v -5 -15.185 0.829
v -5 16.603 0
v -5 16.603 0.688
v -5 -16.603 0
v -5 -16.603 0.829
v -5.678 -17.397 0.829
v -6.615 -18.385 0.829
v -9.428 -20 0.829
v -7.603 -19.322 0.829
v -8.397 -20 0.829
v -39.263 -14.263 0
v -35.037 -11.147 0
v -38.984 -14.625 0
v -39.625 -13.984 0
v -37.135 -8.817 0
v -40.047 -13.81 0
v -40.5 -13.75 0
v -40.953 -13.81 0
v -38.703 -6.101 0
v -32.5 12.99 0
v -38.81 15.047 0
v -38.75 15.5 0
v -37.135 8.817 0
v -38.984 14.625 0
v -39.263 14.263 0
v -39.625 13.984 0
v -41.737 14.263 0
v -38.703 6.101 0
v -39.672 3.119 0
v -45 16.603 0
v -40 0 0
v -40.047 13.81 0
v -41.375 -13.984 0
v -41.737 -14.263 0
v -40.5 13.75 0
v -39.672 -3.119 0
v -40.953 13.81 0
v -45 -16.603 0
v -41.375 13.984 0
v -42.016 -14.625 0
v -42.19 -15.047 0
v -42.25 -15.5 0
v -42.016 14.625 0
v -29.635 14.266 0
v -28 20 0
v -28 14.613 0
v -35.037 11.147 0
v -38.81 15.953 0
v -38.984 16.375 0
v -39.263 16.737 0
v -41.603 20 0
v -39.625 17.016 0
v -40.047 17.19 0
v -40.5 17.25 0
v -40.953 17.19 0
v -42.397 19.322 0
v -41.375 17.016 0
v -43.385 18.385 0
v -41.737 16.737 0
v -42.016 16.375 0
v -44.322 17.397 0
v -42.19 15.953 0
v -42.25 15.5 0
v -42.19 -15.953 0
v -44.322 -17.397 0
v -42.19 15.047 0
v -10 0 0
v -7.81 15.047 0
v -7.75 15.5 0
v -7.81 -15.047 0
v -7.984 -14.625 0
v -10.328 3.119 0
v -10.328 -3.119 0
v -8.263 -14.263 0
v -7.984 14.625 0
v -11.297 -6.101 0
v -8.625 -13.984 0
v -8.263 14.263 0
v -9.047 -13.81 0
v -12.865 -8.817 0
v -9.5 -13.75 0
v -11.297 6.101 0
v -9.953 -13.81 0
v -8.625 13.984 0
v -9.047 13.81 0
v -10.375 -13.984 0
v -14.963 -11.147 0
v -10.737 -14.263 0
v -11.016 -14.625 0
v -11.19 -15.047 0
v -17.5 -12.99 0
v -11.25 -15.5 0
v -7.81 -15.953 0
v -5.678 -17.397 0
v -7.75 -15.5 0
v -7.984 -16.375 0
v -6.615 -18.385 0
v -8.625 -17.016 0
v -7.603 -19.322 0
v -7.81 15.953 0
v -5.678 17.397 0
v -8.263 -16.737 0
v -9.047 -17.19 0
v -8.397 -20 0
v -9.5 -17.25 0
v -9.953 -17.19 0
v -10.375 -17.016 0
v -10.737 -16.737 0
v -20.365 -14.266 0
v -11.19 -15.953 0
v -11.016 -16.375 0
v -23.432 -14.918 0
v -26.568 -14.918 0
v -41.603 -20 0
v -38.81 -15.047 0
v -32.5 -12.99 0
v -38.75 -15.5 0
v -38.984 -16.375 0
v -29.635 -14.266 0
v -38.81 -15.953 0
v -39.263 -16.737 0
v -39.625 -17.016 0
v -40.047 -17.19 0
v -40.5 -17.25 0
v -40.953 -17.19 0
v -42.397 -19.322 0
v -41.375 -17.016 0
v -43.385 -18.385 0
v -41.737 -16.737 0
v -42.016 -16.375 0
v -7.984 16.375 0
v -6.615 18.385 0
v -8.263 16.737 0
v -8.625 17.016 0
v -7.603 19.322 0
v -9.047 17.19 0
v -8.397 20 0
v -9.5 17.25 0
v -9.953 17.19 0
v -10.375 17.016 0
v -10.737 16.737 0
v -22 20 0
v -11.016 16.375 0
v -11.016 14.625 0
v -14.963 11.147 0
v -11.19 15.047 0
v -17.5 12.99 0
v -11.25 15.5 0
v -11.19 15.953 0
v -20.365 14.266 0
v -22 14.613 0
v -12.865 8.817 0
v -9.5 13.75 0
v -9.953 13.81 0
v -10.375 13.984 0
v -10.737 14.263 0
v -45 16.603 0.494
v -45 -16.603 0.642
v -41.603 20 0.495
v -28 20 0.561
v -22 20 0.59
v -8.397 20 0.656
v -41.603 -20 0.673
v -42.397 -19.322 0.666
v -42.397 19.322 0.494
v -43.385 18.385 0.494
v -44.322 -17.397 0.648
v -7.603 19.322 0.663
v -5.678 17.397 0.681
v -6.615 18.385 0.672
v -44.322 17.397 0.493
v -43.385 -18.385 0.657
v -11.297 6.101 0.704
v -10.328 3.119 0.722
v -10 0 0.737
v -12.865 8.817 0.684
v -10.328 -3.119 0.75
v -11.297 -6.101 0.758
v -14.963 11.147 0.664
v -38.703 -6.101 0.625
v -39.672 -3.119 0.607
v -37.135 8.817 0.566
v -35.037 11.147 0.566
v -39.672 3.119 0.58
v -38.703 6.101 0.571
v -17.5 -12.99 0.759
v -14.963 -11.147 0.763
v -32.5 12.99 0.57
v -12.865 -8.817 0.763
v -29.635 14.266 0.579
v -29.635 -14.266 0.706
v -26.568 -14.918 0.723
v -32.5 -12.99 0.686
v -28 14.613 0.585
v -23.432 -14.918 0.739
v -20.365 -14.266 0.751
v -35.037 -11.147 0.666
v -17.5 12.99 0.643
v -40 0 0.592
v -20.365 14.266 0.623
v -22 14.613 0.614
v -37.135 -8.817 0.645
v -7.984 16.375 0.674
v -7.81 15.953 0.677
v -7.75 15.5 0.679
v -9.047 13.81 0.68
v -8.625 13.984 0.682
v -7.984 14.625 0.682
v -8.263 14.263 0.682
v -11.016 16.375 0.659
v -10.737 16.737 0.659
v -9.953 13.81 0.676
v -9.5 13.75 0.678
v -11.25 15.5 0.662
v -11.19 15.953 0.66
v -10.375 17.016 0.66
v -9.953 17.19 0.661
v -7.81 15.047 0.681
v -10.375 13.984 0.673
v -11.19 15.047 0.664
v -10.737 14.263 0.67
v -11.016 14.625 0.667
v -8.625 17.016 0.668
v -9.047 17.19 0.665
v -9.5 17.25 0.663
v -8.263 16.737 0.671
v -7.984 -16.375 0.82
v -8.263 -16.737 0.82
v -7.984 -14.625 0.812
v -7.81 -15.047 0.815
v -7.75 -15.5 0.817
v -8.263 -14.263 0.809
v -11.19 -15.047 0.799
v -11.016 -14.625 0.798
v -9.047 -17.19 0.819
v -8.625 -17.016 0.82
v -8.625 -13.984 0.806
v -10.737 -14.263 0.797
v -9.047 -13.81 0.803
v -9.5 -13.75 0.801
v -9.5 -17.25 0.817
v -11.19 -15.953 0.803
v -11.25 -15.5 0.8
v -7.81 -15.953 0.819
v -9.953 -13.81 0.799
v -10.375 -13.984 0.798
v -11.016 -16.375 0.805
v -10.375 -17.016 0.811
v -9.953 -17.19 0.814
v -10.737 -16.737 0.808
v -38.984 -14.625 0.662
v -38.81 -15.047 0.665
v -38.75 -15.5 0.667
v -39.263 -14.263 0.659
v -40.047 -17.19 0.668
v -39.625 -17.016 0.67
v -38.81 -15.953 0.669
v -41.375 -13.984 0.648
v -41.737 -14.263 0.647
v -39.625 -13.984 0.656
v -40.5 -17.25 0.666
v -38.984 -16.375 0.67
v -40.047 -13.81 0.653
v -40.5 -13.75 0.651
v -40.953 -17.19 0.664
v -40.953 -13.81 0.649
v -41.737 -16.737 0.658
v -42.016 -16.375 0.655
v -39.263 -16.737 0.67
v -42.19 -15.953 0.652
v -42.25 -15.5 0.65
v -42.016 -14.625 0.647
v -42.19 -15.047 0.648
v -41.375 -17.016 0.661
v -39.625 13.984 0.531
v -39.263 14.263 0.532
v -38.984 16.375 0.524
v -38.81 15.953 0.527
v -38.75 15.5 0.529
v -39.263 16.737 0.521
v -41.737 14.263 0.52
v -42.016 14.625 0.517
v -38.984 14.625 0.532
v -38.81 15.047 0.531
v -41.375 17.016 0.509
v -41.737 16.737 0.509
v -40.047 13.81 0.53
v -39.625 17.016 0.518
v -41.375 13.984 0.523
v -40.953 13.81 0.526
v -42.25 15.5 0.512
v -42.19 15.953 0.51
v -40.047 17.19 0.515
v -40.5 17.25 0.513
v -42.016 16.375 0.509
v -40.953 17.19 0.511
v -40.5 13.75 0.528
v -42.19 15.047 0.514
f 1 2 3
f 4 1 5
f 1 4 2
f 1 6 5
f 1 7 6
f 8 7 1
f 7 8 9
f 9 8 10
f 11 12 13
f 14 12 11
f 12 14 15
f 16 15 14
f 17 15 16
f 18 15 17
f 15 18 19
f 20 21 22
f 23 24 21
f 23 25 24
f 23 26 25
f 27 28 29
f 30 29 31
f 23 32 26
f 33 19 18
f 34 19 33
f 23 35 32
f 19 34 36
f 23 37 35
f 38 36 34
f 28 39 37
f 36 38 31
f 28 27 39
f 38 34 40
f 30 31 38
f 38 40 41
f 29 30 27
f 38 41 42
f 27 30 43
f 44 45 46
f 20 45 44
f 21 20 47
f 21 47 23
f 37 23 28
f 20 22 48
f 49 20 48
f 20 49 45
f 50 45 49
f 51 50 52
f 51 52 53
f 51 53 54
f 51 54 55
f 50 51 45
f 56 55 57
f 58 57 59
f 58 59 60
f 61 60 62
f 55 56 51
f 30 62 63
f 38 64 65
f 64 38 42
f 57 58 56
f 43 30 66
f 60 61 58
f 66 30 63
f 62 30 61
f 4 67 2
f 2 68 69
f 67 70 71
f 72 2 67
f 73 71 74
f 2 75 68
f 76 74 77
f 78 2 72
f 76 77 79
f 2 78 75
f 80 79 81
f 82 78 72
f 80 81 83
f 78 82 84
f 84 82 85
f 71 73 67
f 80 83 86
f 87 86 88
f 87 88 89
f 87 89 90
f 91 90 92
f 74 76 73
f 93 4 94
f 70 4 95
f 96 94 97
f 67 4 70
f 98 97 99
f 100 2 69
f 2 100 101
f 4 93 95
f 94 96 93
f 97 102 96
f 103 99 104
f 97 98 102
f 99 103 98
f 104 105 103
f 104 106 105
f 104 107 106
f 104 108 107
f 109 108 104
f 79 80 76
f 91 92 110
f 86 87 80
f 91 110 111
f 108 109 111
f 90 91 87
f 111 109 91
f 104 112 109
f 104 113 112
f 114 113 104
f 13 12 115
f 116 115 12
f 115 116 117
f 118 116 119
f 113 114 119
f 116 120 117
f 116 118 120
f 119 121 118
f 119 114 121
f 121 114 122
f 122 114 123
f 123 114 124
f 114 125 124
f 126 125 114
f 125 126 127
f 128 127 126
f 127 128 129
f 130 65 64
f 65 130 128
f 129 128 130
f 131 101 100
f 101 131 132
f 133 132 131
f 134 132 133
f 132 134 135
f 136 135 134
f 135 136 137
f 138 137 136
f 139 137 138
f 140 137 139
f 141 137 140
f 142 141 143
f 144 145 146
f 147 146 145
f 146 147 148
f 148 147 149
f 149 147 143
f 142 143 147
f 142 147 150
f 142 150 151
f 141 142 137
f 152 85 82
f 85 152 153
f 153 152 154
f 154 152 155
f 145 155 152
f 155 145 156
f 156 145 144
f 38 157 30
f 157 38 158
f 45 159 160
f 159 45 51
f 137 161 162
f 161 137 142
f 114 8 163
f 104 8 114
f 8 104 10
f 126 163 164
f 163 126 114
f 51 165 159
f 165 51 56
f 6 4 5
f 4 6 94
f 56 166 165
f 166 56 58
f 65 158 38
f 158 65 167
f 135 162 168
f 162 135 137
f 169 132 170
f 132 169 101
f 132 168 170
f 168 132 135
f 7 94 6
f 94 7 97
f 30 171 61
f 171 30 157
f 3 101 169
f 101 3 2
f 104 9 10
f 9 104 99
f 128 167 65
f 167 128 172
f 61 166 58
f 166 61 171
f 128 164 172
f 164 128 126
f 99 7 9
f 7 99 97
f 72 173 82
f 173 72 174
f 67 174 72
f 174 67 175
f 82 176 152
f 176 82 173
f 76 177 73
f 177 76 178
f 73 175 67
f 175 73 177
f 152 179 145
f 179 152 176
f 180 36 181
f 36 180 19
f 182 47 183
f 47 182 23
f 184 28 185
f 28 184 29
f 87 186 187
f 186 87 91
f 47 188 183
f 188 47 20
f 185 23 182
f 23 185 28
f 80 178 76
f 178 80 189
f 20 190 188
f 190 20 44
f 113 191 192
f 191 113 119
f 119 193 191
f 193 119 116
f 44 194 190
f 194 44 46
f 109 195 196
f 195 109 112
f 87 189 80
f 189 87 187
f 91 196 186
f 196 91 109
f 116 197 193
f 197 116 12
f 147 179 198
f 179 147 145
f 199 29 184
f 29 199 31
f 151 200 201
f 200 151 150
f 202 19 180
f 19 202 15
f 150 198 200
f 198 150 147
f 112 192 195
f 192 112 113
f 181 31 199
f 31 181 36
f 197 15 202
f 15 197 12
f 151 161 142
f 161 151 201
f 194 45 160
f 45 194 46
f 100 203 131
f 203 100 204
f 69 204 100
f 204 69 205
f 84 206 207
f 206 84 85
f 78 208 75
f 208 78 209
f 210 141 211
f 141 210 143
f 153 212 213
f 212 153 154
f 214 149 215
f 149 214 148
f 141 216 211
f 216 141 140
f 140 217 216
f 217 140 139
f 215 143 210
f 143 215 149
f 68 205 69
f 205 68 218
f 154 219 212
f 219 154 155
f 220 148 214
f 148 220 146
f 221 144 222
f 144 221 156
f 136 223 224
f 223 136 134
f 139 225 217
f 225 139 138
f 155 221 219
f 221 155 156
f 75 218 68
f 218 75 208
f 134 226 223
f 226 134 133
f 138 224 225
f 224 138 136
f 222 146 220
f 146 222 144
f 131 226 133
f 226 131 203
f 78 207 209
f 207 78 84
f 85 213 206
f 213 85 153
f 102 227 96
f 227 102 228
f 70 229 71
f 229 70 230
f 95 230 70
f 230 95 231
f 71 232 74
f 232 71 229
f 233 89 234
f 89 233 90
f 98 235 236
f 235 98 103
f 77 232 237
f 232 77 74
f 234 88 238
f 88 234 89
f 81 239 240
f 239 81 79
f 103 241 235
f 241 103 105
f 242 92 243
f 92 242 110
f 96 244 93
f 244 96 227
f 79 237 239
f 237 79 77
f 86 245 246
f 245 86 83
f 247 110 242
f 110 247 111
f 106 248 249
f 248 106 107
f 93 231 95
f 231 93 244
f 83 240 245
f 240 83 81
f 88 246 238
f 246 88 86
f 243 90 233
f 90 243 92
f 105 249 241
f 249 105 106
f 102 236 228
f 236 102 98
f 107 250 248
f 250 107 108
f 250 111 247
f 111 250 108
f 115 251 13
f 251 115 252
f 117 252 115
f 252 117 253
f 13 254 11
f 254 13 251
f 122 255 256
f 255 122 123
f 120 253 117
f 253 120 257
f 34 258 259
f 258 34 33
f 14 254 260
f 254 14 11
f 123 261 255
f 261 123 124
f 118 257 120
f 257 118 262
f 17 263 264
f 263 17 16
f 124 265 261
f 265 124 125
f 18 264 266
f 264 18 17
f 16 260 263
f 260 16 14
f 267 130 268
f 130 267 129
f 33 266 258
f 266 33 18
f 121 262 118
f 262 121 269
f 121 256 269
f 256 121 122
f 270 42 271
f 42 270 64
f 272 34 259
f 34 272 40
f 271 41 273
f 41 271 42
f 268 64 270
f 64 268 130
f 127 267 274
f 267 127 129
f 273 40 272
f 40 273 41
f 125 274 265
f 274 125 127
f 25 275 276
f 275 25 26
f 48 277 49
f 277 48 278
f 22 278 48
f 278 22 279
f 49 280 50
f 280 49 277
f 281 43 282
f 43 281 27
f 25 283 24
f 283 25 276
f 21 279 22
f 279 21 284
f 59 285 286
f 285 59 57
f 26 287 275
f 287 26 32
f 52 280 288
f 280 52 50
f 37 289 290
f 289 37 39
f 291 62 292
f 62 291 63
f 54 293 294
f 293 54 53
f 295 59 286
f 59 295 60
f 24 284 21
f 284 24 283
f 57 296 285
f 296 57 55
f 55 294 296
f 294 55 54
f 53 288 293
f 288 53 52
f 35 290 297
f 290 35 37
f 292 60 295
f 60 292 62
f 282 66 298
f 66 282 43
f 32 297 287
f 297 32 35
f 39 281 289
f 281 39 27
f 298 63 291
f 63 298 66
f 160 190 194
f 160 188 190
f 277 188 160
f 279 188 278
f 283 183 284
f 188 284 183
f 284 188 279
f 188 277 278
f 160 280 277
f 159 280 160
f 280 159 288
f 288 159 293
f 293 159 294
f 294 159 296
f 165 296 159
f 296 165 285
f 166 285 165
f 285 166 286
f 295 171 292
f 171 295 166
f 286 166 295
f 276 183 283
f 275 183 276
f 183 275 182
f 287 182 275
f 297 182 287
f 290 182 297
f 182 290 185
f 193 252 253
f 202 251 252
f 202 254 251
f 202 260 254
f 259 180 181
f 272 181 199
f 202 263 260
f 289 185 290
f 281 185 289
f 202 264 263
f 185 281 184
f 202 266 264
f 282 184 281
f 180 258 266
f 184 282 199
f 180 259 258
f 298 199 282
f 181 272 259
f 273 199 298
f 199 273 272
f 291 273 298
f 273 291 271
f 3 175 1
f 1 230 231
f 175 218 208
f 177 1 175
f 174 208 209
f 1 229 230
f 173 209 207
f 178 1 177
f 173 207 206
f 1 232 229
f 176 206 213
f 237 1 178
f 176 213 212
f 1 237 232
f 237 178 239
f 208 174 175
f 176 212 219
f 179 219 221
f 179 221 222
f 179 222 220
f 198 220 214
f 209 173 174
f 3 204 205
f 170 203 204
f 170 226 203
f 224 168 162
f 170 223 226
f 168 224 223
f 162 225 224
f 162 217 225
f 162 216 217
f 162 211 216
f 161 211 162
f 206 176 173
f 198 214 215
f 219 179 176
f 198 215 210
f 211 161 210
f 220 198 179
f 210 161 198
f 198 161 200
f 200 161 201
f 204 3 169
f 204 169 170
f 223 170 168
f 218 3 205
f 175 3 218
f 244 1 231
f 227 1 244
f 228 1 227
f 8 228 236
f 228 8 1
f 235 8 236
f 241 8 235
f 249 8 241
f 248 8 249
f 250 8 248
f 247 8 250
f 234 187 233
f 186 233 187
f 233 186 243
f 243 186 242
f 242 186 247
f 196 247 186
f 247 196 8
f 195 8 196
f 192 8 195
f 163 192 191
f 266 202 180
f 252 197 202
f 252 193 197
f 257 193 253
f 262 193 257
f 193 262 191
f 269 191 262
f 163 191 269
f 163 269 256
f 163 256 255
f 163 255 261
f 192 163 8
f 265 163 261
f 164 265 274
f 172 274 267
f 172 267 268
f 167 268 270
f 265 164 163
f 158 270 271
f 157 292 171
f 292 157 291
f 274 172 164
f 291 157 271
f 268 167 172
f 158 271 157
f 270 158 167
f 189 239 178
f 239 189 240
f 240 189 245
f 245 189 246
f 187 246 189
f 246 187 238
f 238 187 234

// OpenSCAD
module nema17shim(slope,rotation){
difference(){
intersection(){
translate([-20,-20,0])cube([40,40,slope*50+0.5]);
cylinder(r=26,h=slope*105+2,$fn=120);
}//intersection
cylinder(r=15,h=slope*105+2,center=true);
translate([-3,0,-1])cube([6,40,slope*105+2]);
translate([15.5,15.5,0])cylinder(r=1.75,h=slope*105+1,center=true,$fn=24);
translate([15.5,-15.5,0])cylinder(r=1.75,h=slope*105+1,center=true,$fn=24);
translate([-15.5,-15.5,0])cylinder(r=1.75,h=slope*105+1,center=true,$fn=24);
translate([-15.5,15.5,0])cylinder(r=1.75,h=slope*105+1,center=true,$fn=24);
rotate(a=rotation)translate([0,0,slope*25+0.5])rotate(a=atan(slope),v=[0,1,0])translate([-40,-40,0])cube([80,80,slope*50+0.5]);
}//difference
}

//translate([-25,0,0])nema17shim(slope=76/5000,rotation=35);//left
//translate([25,0,0])nema17shim(slope=39.6/5000,rotation=45);//right
//translate([-25,0,0])nema17shim(slope=0.01805,rotation=78.104);//left
//translate([25,0,0])nema17shim(slope=0.007588,rotation=152.4);//right
//translate([-25,0,0])nema17shim(slope=0.012287,rotation=68.81);//left
//translate([25,0,0])nema17shim(slope=0.005811,rotation=98.76);//right
translate([-25,0,0])nema17shim(slope=0.0065844,rotation=137.4);//right
